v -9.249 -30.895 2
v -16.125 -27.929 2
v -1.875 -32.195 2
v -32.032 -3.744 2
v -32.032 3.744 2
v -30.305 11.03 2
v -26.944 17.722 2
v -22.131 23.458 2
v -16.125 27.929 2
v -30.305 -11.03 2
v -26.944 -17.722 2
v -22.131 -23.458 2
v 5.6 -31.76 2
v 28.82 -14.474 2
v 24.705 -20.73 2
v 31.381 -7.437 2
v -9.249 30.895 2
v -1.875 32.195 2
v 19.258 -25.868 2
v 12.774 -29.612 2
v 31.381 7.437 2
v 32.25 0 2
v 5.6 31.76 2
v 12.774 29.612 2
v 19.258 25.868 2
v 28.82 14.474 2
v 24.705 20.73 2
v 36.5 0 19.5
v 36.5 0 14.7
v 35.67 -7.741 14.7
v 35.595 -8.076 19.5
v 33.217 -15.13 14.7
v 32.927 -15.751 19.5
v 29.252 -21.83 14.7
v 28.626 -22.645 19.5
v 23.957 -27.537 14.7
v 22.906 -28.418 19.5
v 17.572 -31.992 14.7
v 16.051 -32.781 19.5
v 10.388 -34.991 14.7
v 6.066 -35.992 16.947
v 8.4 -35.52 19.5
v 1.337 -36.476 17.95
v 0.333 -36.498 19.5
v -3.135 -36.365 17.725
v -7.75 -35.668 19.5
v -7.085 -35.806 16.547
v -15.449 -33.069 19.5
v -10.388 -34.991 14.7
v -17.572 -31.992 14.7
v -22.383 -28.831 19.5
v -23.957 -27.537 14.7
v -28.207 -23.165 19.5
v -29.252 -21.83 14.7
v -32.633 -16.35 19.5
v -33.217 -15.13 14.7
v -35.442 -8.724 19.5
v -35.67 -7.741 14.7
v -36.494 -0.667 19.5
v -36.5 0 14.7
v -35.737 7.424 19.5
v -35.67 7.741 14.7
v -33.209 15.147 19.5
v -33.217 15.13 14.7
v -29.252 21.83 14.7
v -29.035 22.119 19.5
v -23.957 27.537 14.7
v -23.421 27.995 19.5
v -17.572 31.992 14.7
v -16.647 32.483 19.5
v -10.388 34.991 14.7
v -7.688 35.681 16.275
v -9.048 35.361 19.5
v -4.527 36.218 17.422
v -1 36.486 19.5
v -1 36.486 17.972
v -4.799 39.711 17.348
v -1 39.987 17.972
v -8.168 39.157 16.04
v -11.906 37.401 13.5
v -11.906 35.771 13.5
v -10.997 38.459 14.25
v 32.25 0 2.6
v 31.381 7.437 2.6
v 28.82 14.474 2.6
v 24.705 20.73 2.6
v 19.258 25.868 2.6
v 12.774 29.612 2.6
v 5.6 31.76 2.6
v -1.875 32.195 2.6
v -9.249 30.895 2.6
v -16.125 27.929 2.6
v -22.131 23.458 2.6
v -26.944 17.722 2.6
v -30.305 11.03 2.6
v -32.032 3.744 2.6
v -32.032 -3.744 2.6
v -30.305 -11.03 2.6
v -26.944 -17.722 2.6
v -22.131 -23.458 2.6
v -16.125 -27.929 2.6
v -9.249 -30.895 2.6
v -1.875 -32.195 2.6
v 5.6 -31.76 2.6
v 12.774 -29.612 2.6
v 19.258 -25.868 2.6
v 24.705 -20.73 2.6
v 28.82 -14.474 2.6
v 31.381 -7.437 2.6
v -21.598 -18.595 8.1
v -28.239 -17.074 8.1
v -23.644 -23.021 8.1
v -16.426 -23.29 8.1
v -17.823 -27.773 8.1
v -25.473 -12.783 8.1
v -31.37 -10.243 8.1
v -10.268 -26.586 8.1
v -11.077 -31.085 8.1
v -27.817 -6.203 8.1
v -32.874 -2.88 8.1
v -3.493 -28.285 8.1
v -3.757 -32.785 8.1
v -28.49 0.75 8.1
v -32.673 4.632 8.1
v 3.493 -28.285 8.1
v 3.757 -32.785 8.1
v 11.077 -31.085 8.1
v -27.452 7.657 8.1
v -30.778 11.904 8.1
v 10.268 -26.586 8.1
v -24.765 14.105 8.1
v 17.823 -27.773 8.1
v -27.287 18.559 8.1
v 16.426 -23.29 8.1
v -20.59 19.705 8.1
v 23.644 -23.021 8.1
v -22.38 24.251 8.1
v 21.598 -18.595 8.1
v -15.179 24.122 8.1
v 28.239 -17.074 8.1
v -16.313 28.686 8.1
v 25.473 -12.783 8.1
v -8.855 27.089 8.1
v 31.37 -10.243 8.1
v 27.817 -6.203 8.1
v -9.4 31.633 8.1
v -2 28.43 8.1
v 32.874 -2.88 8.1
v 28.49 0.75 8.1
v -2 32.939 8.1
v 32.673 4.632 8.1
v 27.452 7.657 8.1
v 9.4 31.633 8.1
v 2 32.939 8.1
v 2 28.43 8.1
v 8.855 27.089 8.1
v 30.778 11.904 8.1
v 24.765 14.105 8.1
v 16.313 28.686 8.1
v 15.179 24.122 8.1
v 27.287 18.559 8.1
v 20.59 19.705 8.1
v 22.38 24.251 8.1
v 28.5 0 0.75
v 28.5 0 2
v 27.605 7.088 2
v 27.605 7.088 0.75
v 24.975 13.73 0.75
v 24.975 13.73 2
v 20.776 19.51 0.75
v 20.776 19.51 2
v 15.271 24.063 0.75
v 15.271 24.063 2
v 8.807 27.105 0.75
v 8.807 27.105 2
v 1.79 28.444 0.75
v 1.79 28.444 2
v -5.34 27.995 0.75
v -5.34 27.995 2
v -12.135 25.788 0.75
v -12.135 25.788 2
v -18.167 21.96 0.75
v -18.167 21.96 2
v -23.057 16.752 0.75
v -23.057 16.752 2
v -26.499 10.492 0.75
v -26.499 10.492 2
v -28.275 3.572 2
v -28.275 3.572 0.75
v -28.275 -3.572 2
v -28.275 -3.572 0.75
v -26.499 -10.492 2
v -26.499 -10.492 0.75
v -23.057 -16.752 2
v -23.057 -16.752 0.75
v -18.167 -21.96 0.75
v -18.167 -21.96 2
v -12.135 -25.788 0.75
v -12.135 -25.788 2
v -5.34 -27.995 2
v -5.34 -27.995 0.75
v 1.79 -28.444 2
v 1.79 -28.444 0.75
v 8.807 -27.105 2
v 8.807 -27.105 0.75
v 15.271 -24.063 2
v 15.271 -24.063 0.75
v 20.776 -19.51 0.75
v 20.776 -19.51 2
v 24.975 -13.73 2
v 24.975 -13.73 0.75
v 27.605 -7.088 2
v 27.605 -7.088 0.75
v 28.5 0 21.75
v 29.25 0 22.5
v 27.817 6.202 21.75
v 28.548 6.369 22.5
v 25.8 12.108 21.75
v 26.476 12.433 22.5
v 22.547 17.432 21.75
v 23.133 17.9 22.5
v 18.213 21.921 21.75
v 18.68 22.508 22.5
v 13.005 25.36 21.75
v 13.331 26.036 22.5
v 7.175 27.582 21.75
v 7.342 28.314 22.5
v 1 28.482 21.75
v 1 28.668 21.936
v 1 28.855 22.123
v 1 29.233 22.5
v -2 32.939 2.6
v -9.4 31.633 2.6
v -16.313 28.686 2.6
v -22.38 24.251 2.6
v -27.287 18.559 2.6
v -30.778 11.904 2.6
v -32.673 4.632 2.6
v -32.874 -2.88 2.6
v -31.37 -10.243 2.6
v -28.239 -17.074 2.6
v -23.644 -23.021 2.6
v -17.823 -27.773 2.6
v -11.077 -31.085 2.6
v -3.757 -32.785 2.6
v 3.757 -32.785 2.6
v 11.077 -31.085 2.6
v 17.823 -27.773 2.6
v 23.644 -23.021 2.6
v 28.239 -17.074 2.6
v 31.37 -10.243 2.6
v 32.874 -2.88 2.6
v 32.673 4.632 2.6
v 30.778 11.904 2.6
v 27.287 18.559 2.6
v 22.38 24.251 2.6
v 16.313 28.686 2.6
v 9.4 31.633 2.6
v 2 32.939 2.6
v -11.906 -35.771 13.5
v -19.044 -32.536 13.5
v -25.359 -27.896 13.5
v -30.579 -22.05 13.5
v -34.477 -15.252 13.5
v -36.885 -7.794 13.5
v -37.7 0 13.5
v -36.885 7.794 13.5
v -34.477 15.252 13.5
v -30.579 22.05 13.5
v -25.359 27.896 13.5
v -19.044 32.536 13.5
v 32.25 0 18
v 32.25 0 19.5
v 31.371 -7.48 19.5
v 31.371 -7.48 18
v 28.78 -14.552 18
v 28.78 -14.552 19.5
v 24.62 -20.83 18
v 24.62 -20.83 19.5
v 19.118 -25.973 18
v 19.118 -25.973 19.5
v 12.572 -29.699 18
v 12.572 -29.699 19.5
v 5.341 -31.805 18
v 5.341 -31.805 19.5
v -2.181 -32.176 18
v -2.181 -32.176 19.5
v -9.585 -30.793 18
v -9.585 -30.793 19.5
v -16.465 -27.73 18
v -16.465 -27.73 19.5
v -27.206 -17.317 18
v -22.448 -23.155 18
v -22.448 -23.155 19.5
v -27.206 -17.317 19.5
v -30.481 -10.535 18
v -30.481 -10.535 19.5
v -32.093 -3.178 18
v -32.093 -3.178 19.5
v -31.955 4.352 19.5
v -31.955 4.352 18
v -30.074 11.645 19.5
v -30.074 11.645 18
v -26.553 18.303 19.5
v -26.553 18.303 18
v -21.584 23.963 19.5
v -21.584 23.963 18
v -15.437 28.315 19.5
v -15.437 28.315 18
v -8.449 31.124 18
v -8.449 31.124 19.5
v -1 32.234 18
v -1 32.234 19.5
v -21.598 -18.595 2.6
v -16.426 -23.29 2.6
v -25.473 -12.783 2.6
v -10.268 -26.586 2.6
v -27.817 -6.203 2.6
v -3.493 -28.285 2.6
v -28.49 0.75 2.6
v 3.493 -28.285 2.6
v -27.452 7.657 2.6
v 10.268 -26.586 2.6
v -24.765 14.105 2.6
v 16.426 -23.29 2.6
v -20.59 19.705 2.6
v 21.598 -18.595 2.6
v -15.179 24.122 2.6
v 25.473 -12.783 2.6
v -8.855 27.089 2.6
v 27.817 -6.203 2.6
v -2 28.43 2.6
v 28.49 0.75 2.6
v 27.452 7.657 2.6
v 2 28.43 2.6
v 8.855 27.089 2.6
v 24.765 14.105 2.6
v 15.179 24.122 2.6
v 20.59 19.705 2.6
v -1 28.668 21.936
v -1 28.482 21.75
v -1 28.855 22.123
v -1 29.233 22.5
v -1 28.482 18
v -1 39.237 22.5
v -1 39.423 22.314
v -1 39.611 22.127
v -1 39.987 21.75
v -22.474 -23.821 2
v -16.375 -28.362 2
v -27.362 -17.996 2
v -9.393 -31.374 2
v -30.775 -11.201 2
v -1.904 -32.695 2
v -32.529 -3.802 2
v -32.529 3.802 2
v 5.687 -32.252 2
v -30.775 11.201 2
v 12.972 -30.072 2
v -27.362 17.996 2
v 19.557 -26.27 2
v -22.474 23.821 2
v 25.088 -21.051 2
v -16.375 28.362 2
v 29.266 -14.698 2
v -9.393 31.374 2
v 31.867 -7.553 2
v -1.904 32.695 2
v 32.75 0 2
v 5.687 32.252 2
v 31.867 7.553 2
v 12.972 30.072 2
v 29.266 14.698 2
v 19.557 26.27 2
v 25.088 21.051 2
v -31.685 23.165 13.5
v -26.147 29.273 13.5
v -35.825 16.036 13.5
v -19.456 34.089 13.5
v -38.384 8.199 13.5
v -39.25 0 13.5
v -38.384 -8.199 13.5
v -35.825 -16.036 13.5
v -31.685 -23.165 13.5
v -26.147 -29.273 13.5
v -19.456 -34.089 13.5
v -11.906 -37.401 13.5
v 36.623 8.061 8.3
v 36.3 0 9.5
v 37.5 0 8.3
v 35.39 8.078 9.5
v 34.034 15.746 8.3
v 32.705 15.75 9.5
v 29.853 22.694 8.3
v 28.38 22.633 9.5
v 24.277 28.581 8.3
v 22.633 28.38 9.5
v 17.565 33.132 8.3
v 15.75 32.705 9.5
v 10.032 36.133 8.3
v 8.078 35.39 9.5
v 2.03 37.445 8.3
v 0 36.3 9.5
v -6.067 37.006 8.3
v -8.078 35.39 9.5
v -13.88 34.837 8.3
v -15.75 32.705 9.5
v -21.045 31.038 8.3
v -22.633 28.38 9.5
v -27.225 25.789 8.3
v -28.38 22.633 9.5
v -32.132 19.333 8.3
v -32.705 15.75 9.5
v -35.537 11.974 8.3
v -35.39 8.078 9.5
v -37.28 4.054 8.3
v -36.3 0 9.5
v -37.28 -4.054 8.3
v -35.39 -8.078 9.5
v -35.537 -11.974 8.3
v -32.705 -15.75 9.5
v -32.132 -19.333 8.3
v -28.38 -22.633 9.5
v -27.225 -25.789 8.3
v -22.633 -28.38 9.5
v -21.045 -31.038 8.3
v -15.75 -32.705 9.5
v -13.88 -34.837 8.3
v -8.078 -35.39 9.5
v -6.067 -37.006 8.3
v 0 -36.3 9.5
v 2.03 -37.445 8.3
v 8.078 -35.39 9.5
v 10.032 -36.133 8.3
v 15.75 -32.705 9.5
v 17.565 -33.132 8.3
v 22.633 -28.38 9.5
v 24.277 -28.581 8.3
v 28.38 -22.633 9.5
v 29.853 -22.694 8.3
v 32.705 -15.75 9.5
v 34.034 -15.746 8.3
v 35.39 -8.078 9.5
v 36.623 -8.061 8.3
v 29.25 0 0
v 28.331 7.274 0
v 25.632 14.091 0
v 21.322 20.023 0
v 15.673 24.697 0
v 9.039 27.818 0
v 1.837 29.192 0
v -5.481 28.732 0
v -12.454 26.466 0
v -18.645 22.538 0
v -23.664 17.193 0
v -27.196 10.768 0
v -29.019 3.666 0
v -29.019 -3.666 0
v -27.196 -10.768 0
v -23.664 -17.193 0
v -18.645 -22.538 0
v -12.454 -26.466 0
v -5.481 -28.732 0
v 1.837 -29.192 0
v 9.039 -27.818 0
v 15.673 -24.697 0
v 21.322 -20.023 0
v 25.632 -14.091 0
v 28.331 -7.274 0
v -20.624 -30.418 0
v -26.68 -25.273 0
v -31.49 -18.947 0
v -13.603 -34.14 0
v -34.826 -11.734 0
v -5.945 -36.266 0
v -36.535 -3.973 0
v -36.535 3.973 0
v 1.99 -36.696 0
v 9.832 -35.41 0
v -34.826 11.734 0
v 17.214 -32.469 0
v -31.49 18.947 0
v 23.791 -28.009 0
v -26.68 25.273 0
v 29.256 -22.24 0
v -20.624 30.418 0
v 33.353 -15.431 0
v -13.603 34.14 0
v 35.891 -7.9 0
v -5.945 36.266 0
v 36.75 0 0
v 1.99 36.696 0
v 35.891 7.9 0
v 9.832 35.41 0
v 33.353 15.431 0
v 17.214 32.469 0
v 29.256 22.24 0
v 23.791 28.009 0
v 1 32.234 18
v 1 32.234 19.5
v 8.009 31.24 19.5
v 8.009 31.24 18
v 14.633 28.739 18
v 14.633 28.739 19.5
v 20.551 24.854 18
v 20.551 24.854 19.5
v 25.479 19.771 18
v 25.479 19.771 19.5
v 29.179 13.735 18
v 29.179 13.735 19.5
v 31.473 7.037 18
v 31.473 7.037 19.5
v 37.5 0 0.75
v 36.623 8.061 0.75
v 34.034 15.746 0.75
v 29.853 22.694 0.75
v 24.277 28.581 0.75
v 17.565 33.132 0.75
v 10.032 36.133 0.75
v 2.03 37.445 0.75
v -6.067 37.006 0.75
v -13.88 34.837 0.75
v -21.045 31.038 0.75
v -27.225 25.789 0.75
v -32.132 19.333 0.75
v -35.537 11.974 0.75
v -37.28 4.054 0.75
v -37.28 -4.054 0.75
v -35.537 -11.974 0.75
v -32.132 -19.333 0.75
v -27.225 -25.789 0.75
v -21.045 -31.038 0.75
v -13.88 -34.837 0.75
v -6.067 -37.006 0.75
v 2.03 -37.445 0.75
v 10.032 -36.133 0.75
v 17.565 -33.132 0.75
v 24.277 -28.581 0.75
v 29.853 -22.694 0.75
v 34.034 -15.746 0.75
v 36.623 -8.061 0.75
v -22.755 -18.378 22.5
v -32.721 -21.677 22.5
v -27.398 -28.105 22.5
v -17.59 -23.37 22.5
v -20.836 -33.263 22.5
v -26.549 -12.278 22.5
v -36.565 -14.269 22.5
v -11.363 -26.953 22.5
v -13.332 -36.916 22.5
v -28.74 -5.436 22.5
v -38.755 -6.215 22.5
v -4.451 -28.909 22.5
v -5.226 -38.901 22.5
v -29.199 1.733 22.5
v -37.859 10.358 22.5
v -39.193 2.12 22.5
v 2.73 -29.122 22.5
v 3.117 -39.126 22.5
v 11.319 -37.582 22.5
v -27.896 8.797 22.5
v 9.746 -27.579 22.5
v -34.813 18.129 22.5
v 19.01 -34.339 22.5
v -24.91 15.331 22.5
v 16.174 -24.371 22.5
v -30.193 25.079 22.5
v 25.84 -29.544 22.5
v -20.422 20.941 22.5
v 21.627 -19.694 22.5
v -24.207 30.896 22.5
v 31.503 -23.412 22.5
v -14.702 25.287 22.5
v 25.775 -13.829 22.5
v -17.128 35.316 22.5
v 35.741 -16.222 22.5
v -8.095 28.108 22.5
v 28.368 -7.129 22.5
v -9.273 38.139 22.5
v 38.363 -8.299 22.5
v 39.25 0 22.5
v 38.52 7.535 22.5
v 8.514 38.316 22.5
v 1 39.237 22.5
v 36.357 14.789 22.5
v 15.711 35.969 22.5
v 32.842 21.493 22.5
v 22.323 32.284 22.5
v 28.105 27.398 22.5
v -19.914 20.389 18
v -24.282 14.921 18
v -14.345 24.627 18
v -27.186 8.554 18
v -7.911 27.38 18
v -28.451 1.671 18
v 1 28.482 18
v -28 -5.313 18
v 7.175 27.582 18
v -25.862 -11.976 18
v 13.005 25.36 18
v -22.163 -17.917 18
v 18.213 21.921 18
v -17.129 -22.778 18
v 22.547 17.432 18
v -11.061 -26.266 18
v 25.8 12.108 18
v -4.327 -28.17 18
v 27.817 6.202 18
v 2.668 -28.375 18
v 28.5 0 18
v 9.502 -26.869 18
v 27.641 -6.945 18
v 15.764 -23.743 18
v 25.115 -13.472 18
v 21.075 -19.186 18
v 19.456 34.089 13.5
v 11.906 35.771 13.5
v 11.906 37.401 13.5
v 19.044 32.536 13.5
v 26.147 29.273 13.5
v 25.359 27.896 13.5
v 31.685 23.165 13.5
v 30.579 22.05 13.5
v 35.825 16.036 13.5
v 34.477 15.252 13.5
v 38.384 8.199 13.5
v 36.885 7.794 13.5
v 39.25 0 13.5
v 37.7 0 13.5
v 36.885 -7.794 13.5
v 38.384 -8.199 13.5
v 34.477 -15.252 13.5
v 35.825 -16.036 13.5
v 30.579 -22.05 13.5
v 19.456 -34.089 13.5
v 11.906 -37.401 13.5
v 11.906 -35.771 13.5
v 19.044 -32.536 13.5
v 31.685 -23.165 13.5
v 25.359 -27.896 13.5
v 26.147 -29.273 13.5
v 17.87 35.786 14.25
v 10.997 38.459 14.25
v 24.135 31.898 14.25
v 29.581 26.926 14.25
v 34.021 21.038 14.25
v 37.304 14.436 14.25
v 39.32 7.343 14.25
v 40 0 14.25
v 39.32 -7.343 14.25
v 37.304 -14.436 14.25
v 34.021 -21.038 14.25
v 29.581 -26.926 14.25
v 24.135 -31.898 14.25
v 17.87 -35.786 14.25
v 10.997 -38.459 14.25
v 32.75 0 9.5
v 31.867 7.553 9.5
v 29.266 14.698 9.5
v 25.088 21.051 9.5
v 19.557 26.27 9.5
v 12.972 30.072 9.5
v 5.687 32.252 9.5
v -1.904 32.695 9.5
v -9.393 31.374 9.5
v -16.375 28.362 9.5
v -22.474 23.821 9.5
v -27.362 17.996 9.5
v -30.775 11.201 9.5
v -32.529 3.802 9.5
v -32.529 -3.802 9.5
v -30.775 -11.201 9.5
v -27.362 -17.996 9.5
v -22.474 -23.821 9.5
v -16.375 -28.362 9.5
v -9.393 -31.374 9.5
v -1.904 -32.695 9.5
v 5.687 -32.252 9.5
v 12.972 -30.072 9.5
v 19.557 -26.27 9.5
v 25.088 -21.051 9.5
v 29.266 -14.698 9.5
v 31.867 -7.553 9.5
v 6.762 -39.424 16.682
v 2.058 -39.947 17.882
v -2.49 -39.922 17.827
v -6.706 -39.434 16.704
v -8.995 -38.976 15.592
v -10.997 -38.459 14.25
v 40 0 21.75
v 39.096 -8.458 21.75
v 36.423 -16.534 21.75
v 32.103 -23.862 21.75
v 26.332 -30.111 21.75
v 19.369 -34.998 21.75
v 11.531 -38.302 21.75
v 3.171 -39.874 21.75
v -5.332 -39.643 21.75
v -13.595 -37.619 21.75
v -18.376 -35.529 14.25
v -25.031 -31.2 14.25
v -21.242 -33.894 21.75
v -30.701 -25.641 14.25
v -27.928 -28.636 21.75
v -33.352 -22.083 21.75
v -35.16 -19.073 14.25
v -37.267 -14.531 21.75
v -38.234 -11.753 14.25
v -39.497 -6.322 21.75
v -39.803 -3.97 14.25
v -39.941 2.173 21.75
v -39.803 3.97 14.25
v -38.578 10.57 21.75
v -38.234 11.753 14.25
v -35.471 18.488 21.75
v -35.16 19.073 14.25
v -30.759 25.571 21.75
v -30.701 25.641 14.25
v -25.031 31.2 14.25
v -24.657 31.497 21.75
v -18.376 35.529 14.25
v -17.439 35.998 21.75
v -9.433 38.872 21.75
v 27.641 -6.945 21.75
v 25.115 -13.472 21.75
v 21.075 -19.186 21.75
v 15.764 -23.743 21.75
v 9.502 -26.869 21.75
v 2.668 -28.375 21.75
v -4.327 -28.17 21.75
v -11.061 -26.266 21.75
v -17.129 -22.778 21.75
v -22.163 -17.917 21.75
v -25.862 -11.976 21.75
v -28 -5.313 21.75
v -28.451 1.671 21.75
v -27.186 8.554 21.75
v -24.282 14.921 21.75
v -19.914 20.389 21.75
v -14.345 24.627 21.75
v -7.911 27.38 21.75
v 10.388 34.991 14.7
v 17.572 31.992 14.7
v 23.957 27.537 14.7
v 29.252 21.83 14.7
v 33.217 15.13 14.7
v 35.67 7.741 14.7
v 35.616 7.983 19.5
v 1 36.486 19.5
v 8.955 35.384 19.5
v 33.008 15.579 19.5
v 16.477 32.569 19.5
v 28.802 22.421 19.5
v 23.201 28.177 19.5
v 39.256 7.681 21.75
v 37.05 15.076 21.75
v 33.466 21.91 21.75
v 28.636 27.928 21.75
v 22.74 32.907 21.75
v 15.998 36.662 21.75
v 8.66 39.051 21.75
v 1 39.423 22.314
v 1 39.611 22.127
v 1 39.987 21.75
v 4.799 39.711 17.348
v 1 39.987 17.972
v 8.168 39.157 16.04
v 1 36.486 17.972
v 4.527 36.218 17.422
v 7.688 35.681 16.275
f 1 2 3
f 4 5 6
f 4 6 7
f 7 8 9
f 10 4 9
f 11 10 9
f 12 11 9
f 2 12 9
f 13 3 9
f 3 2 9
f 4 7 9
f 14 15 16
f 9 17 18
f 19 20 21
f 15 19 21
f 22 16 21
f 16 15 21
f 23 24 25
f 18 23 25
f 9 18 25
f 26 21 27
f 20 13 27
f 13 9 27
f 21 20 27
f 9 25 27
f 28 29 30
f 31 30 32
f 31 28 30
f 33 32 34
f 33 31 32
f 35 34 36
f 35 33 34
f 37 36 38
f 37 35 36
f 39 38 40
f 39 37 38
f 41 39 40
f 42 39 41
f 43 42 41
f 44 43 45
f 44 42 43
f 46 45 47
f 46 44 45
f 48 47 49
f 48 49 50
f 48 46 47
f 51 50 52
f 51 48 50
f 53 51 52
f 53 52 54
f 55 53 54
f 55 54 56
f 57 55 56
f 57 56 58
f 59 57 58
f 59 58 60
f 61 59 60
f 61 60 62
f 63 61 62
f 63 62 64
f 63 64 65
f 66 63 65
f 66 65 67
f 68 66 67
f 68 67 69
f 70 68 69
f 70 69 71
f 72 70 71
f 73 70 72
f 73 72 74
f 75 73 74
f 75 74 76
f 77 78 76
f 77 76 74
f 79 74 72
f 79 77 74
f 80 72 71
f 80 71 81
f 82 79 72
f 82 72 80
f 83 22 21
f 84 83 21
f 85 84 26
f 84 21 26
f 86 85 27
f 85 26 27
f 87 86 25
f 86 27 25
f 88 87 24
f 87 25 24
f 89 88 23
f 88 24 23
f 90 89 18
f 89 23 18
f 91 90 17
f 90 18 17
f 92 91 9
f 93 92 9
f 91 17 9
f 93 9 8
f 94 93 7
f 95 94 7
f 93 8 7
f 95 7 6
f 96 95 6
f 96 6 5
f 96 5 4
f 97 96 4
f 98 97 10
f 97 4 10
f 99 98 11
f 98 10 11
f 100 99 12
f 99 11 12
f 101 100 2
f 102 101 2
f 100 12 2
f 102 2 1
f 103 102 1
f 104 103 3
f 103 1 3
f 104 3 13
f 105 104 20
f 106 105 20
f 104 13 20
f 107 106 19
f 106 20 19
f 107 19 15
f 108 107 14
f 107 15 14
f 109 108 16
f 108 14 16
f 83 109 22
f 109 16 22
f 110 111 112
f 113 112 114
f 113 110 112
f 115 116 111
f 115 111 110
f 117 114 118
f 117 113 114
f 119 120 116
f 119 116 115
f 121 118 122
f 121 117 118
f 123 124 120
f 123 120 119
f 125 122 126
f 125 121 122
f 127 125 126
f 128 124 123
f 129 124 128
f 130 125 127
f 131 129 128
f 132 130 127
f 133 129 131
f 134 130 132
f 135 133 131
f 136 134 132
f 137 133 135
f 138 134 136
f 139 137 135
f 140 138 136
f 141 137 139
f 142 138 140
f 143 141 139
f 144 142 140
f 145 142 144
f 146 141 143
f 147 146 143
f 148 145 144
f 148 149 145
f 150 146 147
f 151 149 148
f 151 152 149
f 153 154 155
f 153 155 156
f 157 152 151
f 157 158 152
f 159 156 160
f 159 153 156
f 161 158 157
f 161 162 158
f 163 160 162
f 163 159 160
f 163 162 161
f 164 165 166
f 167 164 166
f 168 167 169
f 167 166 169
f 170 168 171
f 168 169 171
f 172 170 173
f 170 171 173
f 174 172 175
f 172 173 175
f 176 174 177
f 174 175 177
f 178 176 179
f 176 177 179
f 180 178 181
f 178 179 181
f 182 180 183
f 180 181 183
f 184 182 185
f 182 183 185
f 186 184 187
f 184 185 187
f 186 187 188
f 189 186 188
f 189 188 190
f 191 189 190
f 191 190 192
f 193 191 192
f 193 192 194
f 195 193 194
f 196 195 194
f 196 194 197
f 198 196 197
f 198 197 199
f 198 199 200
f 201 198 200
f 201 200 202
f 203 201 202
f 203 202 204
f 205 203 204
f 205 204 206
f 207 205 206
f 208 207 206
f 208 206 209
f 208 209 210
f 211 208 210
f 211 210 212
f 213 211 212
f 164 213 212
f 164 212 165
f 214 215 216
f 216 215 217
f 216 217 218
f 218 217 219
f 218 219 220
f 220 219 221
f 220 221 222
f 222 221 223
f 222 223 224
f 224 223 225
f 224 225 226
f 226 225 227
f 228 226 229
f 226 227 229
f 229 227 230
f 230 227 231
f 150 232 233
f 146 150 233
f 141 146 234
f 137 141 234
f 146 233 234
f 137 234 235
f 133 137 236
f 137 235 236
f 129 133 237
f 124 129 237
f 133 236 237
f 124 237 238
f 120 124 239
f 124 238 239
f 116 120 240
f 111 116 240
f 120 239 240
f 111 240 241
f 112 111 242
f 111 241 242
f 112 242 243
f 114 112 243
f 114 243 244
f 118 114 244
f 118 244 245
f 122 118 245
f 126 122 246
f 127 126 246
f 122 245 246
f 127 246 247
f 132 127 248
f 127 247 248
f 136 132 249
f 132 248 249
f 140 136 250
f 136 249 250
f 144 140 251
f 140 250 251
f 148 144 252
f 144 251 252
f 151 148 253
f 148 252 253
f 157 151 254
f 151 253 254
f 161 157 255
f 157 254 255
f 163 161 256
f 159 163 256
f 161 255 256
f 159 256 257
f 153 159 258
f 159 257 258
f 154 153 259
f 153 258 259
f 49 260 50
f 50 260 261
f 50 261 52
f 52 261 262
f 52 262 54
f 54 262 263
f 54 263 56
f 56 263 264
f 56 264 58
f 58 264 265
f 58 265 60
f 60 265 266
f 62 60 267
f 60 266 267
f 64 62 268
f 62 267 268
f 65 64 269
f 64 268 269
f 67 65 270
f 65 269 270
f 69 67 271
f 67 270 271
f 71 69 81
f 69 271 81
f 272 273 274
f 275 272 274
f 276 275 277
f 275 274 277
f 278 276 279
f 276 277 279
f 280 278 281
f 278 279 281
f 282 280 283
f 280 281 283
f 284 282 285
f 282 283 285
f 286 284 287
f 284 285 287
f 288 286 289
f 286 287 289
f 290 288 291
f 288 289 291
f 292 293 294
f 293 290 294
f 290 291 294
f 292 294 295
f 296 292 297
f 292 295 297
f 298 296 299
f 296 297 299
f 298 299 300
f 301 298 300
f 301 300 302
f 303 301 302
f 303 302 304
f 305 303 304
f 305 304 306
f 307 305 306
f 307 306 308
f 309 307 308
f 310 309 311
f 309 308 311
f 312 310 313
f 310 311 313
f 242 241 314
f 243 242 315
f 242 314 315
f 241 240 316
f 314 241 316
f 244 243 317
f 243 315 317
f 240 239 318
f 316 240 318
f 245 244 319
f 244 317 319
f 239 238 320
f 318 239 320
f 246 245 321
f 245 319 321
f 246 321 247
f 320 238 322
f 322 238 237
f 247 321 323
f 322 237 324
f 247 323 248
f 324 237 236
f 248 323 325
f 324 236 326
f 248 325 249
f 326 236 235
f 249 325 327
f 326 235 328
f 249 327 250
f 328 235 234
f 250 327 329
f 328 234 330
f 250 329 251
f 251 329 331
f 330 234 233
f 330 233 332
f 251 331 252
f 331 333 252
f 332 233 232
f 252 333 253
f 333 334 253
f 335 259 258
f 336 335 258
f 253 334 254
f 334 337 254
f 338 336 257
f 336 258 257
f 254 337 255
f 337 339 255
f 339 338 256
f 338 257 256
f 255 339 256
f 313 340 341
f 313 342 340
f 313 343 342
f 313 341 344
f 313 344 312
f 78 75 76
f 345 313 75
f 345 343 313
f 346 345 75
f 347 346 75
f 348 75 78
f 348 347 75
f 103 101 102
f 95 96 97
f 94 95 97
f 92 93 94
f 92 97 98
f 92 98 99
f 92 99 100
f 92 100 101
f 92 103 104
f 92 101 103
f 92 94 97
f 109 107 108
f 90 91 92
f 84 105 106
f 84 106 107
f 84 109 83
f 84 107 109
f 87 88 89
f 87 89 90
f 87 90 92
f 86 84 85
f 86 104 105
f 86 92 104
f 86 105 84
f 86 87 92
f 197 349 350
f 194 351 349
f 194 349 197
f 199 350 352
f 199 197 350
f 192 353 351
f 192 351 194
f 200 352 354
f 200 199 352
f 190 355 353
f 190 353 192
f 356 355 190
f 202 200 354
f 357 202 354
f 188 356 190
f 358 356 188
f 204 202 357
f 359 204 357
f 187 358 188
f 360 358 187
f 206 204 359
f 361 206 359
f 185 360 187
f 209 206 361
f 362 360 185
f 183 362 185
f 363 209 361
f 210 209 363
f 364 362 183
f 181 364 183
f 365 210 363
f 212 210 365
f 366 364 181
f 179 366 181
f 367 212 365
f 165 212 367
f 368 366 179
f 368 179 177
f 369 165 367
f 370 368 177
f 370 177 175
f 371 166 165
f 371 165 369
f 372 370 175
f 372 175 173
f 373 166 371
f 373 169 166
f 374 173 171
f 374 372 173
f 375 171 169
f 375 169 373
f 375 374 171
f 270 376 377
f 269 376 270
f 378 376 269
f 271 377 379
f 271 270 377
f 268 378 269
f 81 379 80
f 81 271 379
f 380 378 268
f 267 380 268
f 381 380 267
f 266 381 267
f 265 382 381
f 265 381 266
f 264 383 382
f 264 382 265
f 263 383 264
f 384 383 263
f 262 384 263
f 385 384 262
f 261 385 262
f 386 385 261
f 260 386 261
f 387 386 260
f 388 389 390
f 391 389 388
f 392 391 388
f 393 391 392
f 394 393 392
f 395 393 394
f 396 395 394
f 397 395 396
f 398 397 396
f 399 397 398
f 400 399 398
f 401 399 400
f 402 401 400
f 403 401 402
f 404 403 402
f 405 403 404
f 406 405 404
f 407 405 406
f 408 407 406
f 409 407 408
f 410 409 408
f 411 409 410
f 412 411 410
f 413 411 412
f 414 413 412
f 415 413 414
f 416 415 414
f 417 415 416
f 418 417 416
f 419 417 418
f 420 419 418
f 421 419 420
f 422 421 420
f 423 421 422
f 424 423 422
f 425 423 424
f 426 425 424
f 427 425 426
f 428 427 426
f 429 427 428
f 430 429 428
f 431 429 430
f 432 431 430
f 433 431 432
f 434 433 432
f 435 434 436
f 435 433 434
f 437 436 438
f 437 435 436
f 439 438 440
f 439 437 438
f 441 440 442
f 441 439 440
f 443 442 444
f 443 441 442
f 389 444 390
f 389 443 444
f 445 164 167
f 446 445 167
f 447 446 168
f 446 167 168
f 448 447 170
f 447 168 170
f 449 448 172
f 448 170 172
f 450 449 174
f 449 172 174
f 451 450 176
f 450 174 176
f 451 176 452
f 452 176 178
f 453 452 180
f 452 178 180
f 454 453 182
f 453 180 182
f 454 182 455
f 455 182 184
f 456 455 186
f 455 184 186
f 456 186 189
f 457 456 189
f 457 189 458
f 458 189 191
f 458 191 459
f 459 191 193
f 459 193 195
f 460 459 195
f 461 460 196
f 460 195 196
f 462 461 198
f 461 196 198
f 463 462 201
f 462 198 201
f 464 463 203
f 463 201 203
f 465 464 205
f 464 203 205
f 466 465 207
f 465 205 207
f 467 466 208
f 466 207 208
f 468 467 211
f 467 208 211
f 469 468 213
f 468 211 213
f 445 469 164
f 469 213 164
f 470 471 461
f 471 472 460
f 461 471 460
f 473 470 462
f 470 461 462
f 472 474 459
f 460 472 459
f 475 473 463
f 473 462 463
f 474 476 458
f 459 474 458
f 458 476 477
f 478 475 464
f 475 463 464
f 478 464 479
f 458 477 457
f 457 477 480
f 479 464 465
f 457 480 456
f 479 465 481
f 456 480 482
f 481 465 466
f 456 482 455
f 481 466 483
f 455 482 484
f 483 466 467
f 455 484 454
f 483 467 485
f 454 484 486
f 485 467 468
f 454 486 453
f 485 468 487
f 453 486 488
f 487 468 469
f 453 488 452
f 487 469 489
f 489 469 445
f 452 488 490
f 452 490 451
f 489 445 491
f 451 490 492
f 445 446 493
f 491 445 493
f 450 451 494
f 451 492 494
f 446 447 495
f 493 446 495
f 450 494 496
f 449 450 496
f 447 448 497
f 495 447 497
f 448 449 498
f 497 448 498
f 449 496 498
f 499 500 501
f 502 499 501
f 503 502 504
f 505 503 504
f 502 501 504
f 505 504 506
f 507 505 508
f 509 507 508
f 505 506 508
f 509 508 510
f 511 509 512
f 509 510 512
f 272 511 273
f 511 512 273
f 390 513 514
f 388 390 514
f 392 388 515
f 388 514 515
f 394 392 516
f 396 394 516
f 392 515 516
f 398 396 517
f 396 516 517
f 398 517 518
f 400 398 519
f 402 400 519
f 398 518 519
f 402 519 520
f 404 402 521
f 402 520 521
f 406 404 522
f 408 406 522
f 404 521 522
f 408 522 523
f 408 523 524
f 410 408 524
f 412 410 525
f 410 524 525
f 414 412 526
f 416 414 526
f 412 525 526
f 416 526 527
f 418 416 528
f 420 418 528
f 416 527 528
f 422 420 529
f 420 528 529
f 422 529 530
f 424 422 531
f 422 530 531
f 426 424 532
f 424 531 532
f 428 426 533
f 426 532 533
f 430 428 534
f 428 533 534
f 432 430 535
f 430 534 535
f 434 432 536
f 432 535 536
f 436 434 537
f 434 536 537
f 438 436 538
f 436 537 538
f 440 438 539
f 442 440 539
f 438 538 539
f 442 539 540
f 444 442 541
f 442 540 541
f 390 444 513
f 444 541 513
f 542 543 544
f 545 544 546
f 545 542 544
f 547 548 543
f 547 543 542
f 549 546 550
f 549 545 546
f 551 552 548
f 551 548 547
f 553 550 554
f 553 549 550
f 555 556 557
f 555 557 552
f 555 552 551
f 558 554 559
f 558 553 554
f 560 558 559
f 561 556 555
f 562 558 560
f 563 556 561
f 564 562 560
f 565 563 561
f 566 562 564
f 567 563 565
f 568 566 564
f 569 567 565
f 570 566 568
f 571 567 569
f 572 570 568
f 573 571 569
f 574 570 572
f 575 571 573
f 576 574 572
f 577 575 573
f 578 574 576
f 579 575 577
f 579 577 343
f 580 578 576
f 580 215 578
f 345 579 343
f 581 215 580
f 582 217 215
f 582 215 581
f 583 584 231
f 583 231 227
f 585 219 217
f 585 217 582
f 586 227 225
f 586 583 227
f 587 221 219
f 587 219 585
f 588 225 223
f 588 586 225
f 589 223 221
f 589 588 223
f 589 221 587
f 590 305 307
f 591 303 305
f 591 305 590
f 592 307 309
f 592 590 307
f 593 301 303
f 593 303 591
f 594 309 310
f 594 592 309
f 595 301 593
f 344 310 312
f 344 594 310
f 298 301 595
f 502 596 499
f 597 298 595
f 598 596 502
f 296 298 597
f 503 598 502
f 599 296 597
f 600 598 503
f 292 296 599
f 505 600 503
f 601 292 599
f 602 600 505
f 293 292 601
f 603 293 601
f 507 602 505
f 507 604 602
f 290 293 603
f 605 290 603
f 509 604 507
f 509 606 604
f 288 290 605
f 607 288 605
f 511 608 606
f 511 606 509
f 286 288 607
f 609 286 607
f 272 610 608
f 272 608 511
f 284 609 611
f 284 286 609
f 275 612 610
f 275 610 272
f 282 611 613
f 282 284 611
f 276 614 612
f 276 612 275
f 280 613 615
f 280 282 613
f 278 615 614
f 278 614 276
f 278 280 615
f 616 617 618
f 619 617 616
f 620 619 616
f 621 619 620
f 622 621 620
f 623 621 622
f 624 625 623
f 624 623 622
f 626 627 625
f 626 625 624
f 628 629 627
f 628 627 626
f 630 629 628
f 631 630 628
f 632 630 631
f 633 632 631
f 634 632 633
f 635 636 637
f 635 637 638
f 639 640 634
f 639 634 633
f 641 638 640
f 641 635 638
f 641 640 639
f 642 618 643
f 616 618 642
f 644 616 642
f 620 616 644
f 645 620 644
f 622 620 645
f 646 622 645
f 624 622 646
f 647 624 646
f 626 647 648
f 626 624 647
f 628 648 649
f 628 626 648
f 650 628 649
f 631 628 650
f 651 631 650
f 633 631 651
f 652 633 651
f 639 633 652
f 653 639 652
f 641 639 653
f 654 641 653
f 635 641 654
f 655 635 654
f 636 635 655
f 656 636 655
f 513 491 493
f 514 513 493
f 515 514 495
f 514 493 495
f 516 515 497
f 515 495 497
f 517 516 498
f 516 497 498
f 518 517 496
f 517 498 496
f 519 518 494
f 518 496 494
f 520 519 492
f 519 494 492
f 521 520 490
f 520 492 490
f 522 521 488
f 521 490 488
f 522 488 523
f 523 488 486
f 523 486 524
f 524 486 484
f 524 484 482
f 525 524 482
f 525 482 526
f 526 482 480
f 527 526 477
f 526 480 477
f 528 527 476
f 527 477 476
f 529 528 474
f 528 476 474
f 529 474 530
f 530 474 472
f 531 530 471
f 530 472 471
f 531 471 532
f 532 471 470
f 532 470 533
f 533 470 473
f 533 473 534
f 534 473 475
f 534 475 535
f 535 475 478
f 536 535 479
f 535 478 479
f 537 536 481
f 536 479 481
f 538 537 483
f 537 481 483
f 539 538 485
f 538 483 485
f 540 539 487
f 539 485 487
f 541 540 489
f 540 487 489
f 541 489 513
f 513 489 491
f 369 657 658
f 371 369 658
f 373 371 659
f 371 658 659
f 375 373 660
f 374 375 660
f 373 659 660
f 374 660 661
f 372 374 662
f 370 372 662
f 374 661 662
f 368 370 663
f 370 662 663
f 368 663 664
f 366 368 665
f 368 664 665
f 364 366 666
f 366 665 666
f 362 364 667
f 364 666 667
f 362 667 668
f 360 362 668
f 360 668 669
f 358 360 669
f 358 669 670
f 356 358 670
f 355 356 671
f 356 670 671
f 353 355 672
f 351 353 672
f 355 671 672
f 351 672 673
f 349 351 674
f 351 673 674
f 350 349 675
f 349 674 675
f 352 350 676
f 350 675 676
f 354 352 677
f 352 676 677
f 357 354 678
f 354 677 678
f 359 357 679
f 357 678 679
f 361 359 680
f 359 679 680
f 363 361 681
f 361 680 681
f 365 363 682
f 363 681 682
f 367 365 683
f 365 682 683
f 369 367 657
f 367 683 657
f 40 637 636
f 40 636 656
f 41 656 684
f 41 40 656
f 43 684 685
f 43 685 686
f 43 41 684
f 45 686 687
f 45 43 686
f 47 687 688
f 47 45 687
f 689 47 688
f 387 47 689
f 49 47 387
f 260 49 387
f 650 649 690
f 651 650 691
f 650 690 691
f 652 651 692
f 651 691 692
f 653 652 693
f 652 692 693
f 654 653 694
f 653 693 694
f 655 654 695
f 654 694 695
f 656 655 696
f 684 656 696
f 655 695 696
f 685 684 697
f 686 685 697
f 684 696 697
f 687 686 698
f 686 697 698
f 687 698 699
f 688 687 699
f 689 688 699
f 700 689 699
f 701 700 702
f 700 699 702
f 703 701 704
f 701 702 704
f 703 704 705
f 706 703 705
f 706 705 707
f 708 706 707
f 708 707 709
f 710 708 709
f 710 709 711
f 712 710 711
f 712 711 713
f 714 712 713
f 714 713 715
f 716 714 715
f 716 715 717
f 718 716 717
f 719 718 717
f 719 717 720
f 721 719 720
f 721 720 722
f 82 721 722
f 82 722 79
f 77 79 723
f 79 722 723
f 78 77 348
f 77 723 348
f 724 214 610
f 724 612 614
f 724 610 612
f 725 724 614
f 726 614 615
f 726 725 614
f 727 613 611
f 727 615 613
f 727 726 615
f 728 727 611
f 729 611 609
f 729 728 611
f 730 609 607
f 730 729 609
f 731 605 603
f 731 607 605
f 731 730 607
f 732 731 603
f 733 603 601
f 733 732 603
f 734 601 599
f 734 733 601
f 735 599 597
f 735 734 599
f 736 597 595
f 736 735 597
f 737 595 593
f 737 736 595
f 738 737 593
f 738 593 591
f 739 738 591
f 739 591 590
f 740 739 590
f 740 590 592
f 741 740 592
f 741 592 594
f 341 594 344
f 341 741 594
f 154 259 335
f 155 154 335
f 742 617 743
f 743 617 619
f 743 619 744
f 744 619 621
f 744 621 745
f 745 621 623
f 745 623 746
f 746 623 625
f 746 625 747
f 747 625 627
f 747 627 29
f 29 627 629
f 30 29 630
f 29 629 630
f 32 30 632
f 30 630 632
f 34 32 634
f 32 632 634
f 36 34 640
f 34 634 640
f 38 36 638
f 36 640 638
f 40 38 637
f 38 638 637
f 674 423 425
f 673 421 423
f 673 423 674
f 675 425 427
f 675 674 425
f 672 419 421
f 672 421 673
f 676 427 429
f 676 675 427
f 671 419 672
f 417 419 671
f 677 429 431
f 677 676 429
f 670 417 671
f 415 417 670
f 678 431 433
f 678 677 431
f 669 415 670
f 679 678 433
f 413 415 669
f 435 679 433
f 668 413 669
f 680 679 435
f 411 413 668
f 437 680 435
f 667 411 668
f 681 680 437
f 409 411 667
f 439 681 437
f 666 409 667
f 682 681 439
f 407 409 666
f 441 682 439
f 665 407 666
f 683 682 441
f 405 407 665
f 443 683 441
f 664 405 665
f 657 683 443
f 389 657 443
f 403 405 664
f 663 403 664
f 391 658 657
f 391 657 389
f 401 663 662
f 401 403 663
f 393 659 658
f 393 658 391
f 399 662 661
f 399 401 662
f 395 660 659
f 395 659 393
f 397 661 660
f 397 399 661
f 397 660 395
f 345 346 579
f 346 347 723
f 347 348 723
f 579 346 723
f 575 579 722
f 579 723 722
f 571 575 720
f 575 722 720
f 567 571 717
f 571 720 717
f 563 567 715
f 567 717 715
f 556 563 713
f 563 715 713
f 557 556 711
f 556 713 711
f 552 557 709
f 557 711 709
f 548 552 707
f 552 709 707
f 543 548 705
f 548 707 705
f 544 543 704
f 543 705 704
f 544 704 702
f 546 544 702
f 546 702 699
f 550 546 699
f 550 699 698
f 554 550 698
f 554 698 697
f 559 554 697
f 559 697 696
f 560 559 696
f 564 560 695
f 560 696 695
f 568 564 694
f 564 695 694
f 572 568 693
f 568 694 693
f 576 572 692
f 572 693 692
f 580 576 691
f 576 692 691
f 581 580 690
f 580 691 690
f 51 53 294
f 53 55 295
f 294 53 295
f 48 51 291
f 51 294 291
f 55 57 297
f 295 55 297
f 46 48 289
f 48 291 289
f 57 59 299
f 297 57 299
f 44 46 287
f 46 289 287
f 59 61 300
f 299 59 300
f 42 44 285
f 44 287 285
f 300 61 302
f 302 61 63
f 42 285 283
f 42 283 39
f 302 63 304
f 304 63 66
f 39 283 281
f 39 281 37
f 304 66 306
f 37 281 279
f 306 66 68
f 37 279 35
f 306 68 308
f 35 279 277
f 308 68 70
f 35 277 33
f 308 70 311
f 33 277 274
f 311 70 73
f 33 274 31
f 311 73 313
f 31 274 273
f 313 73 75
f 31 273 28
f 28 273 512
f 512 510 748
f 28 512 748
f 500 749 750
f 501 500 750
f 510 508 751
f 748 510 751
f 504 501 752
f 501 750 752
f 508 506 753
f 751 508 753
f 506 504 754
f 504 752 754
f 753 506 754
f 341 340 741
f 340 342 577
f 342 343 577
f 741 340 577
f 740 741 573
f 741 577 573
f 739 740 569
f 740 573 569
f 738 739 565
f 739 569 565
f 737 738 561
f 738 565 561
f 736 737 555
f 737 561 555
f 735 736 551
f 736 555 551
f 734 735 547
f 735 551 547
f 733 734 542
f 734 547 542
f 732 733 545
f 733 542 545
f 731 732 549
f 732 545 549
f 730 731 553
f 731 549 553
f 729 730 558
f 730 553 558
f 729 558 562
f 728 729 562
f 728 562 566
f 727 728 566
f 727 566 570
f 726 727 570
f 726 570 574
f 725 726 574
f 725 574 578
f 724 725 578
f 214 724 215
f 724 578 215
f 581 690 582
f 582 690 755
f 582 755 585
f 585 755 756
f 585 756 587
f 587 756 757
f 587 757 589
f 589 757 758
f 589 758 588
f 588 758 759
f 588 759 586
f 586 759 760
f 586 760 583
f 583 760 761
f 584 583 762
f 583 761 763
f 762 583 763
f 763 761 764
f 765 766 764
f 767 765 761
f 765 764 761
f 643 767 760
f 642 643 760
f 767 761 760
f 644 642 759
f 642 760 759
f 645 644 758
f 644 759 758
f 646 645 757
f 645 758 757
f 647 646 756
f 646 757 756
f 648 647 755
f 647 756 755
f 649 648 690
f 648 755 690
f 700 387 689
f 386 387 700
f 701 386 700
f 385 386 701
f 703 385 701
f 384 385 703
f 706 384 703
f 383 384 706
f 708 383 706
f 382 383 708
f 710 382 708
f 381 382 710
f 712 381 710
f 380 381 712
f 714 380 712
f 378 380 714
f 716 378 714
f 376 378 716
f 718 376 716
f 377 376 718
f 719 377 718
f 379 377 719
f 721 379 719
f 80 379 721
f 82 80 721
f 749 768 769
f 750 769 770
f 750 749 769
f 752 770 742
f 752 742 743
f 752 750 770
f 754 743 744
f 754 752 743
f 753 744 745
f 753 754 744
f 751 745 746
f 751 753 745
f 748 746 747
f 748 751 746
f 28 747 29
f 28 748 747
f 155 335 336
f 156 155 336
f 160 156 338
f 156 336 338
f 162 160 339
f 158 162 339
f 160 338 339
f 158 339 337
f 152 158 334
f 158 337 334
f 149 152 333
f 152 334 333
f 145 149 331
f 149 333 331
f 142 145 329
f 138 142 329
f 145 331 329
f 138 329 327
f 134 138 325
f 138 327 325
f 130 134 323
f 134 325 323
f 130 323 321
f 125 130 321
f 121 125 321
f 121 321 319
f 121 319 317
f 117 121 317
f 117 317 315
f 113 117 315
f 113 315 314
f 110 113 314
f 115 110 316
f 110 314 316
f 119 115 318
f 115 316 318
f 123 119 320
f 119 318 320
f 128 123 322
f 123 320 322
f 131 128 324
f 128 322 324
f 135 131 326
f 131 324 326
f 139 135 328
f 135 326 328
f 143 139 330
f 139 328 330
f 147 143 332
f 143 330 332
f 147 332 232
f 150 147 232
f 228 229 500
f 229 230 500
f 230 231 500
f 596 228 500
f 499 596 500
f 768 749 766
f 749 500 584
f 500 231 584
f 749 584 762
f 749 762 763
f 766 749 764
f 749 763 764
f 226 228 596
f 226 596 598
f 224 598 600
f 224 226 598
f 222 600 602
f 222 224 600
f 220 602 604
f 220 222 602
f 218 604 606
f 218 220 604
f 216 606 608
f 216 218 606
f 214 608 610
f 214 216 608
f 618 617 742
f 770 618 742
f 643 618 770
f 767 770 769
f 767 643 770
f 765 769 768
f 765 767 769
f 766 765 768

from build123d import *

# Parameters (mm, degrees)
F0_R       = 37.5
F1_DEPTH   = 9.5
F2_R       = 32.75
F3_DEPTH   = 7.5
F4_R       = 28.5
F5_DEPTH   = 25
F6_R       = 32.25
F7_DEPTH   = 0.6
F9_DEPTH   = 5.5
F11_R      = 40
F11_R_2    = 28.5
F12_DEPTH  = 3
F13_R      = 40
F13_R_2    = 36.5
F14_DEPTH  = 6
F15_R      = 32.25
F15_R_2    = 28.5
F16_DEPTH  = 1.5
F17_W      = 2
F17_H      = 16.657679
F18_DEPTH  = 10
F19_SIZE   = 1.2
F19_2_SIZE = 1.2
F20_SIZE   = 0.75
F20_2_SIZE = 0.75
F23_DEPTH  = 88


with BuildPart() as f1:
    # F0 (on Top) → F1 (new body)
    with BuildSketch(Plane.XY):
        Circle(F0_R)
    extrude(amount=F1_DEPTH)

    # F2 (on face) → F3 (cut)
    with BuildSketch(Plane.XY.offset(9.5)):
        Circle(F2_R)
    extrude(amount=-F3_DEPTH, mode=Mode.SUBTRACT)

    # F4 (on face) → F5 (cut)
    with BuildSketch(Plane.XY.offset(2)):
        Circle(F4_R)
    extrude(amount=-F5_DEPTH, mode=Mode.SUBTRACT)

    # F19
    f19_edges = [f1.edges().sort_by_distance(p)[0] for p in [
        (-37.5, 0, 9.5),
    ]]
    chamfer(f19_edges, length=F19_SIZE)

    # F20
    f20_edges = [f1.edges().sort_by_distance(p)[0] for p in [
        (-37.5, 0, 0),
        (-28.5, 0, 0),
    ]]
    chamfer(f20_edges, length=F20_SIZE)


with BuildPart() as f7:
    # F6 (on face) → F7 (new body)
    with BuildSketch(Plane.XY.offset(2)):
        Circle(F6_R)
    extrude(amount=F7_DEPTH)


with BuildPart() as f9:
    # F8 (on face) → F9 (new body)
    with BuildSketch(Plane.XY.offset(2.6)):
        with BuildLine():
            Line((-2, 28.429738), (-2, 32.939338))
            ThreePointArc((-2, 32.939338), (0, -33), (2, 32.939338))
            Line((2, 32.939338), (2, 28.429738))
            ThreePointArc((2, 28.429738), (0, -28.5), (-2, 28.429738))
        make_face()
    extrude(amount=F9_DEPTH)


with BuildPart() as f12:
    # F11 (on offset) → F12 (new body)
    with BuildSketch(Plane.XY.offset(19.5)):
        Circle(F11_R)
        Circle(F11_R_2, mode=Mode.SUBTRACT)
    extrude(amount=F12_DEPTH)

    # F13 (on face) → F14 (join)
    with BuildSketch(Plane(origin=(0, 0, 19.5), x_dir=(1, 0, 0), z_dir=(0, 0, -1))):
        Circle(F13_R)
        Circle(F13_R_2, mode=Mode.SUBTRACT)
    extrude(amount=F14_DEPTH)

    # F15 (on face) → F16 (join)
    with BuildSketch(Plane(origin=(0, 0, 19.5), x_dir=(1, 0, 0), z_dir=(0, 0, -1))):
        Circle(F15_R)
        Circle(F15_R_2, mode=Mode.SUBTRACT)
    extrude(amount=F16_DEPTH)

    # F17 (on face) → F18 (cut)
    with BuildSketch(Plane.XY.offset(22.5)):
        with Locations((0, 33.980249)):
            Rectangle(F17_W, F17_H)
    extrude(amount=-F18_DEPTH, mode=Mode.SUBTRACT)

    # F19#2
    f19_2_edges = [f12.edges().sort_by_distance(p)[0] for p in [
        (-25.453389, -26.160562, 13.5),
    ]]
    chamfer(f19_2_edges, length=F19_2_SIZE)

    # F20#2
    f20_2_edges = [f12.edges().sort_by_distance(p)[0] for p in [
        (-27.92848, -28.635642, 22.5),
        (-19.795833, -20.503049, 22.5),
        (-27.92848, -28.635642, 13.5),
    ]]
    chamfer(f20_2_edges, length=F20_2_SIZE)

    # F22 (on offset) → F23 (cut)
    with BuildSketch(Plane.XZ.offset(-42.9)):
        with BuildLine():
            Line((-14.040557, 11.263337), (14.040557, 11.263337))
            ThreePointArc((14.040557, 11.263337), (0, 18), (-14.040557, 11.263337))
        make_face()
    extrude(amount=F23_DEPTH, mode=Mode.SUBTRACT)


solid = Compound([f1.part, f7.part, f9.part, f12.part])
